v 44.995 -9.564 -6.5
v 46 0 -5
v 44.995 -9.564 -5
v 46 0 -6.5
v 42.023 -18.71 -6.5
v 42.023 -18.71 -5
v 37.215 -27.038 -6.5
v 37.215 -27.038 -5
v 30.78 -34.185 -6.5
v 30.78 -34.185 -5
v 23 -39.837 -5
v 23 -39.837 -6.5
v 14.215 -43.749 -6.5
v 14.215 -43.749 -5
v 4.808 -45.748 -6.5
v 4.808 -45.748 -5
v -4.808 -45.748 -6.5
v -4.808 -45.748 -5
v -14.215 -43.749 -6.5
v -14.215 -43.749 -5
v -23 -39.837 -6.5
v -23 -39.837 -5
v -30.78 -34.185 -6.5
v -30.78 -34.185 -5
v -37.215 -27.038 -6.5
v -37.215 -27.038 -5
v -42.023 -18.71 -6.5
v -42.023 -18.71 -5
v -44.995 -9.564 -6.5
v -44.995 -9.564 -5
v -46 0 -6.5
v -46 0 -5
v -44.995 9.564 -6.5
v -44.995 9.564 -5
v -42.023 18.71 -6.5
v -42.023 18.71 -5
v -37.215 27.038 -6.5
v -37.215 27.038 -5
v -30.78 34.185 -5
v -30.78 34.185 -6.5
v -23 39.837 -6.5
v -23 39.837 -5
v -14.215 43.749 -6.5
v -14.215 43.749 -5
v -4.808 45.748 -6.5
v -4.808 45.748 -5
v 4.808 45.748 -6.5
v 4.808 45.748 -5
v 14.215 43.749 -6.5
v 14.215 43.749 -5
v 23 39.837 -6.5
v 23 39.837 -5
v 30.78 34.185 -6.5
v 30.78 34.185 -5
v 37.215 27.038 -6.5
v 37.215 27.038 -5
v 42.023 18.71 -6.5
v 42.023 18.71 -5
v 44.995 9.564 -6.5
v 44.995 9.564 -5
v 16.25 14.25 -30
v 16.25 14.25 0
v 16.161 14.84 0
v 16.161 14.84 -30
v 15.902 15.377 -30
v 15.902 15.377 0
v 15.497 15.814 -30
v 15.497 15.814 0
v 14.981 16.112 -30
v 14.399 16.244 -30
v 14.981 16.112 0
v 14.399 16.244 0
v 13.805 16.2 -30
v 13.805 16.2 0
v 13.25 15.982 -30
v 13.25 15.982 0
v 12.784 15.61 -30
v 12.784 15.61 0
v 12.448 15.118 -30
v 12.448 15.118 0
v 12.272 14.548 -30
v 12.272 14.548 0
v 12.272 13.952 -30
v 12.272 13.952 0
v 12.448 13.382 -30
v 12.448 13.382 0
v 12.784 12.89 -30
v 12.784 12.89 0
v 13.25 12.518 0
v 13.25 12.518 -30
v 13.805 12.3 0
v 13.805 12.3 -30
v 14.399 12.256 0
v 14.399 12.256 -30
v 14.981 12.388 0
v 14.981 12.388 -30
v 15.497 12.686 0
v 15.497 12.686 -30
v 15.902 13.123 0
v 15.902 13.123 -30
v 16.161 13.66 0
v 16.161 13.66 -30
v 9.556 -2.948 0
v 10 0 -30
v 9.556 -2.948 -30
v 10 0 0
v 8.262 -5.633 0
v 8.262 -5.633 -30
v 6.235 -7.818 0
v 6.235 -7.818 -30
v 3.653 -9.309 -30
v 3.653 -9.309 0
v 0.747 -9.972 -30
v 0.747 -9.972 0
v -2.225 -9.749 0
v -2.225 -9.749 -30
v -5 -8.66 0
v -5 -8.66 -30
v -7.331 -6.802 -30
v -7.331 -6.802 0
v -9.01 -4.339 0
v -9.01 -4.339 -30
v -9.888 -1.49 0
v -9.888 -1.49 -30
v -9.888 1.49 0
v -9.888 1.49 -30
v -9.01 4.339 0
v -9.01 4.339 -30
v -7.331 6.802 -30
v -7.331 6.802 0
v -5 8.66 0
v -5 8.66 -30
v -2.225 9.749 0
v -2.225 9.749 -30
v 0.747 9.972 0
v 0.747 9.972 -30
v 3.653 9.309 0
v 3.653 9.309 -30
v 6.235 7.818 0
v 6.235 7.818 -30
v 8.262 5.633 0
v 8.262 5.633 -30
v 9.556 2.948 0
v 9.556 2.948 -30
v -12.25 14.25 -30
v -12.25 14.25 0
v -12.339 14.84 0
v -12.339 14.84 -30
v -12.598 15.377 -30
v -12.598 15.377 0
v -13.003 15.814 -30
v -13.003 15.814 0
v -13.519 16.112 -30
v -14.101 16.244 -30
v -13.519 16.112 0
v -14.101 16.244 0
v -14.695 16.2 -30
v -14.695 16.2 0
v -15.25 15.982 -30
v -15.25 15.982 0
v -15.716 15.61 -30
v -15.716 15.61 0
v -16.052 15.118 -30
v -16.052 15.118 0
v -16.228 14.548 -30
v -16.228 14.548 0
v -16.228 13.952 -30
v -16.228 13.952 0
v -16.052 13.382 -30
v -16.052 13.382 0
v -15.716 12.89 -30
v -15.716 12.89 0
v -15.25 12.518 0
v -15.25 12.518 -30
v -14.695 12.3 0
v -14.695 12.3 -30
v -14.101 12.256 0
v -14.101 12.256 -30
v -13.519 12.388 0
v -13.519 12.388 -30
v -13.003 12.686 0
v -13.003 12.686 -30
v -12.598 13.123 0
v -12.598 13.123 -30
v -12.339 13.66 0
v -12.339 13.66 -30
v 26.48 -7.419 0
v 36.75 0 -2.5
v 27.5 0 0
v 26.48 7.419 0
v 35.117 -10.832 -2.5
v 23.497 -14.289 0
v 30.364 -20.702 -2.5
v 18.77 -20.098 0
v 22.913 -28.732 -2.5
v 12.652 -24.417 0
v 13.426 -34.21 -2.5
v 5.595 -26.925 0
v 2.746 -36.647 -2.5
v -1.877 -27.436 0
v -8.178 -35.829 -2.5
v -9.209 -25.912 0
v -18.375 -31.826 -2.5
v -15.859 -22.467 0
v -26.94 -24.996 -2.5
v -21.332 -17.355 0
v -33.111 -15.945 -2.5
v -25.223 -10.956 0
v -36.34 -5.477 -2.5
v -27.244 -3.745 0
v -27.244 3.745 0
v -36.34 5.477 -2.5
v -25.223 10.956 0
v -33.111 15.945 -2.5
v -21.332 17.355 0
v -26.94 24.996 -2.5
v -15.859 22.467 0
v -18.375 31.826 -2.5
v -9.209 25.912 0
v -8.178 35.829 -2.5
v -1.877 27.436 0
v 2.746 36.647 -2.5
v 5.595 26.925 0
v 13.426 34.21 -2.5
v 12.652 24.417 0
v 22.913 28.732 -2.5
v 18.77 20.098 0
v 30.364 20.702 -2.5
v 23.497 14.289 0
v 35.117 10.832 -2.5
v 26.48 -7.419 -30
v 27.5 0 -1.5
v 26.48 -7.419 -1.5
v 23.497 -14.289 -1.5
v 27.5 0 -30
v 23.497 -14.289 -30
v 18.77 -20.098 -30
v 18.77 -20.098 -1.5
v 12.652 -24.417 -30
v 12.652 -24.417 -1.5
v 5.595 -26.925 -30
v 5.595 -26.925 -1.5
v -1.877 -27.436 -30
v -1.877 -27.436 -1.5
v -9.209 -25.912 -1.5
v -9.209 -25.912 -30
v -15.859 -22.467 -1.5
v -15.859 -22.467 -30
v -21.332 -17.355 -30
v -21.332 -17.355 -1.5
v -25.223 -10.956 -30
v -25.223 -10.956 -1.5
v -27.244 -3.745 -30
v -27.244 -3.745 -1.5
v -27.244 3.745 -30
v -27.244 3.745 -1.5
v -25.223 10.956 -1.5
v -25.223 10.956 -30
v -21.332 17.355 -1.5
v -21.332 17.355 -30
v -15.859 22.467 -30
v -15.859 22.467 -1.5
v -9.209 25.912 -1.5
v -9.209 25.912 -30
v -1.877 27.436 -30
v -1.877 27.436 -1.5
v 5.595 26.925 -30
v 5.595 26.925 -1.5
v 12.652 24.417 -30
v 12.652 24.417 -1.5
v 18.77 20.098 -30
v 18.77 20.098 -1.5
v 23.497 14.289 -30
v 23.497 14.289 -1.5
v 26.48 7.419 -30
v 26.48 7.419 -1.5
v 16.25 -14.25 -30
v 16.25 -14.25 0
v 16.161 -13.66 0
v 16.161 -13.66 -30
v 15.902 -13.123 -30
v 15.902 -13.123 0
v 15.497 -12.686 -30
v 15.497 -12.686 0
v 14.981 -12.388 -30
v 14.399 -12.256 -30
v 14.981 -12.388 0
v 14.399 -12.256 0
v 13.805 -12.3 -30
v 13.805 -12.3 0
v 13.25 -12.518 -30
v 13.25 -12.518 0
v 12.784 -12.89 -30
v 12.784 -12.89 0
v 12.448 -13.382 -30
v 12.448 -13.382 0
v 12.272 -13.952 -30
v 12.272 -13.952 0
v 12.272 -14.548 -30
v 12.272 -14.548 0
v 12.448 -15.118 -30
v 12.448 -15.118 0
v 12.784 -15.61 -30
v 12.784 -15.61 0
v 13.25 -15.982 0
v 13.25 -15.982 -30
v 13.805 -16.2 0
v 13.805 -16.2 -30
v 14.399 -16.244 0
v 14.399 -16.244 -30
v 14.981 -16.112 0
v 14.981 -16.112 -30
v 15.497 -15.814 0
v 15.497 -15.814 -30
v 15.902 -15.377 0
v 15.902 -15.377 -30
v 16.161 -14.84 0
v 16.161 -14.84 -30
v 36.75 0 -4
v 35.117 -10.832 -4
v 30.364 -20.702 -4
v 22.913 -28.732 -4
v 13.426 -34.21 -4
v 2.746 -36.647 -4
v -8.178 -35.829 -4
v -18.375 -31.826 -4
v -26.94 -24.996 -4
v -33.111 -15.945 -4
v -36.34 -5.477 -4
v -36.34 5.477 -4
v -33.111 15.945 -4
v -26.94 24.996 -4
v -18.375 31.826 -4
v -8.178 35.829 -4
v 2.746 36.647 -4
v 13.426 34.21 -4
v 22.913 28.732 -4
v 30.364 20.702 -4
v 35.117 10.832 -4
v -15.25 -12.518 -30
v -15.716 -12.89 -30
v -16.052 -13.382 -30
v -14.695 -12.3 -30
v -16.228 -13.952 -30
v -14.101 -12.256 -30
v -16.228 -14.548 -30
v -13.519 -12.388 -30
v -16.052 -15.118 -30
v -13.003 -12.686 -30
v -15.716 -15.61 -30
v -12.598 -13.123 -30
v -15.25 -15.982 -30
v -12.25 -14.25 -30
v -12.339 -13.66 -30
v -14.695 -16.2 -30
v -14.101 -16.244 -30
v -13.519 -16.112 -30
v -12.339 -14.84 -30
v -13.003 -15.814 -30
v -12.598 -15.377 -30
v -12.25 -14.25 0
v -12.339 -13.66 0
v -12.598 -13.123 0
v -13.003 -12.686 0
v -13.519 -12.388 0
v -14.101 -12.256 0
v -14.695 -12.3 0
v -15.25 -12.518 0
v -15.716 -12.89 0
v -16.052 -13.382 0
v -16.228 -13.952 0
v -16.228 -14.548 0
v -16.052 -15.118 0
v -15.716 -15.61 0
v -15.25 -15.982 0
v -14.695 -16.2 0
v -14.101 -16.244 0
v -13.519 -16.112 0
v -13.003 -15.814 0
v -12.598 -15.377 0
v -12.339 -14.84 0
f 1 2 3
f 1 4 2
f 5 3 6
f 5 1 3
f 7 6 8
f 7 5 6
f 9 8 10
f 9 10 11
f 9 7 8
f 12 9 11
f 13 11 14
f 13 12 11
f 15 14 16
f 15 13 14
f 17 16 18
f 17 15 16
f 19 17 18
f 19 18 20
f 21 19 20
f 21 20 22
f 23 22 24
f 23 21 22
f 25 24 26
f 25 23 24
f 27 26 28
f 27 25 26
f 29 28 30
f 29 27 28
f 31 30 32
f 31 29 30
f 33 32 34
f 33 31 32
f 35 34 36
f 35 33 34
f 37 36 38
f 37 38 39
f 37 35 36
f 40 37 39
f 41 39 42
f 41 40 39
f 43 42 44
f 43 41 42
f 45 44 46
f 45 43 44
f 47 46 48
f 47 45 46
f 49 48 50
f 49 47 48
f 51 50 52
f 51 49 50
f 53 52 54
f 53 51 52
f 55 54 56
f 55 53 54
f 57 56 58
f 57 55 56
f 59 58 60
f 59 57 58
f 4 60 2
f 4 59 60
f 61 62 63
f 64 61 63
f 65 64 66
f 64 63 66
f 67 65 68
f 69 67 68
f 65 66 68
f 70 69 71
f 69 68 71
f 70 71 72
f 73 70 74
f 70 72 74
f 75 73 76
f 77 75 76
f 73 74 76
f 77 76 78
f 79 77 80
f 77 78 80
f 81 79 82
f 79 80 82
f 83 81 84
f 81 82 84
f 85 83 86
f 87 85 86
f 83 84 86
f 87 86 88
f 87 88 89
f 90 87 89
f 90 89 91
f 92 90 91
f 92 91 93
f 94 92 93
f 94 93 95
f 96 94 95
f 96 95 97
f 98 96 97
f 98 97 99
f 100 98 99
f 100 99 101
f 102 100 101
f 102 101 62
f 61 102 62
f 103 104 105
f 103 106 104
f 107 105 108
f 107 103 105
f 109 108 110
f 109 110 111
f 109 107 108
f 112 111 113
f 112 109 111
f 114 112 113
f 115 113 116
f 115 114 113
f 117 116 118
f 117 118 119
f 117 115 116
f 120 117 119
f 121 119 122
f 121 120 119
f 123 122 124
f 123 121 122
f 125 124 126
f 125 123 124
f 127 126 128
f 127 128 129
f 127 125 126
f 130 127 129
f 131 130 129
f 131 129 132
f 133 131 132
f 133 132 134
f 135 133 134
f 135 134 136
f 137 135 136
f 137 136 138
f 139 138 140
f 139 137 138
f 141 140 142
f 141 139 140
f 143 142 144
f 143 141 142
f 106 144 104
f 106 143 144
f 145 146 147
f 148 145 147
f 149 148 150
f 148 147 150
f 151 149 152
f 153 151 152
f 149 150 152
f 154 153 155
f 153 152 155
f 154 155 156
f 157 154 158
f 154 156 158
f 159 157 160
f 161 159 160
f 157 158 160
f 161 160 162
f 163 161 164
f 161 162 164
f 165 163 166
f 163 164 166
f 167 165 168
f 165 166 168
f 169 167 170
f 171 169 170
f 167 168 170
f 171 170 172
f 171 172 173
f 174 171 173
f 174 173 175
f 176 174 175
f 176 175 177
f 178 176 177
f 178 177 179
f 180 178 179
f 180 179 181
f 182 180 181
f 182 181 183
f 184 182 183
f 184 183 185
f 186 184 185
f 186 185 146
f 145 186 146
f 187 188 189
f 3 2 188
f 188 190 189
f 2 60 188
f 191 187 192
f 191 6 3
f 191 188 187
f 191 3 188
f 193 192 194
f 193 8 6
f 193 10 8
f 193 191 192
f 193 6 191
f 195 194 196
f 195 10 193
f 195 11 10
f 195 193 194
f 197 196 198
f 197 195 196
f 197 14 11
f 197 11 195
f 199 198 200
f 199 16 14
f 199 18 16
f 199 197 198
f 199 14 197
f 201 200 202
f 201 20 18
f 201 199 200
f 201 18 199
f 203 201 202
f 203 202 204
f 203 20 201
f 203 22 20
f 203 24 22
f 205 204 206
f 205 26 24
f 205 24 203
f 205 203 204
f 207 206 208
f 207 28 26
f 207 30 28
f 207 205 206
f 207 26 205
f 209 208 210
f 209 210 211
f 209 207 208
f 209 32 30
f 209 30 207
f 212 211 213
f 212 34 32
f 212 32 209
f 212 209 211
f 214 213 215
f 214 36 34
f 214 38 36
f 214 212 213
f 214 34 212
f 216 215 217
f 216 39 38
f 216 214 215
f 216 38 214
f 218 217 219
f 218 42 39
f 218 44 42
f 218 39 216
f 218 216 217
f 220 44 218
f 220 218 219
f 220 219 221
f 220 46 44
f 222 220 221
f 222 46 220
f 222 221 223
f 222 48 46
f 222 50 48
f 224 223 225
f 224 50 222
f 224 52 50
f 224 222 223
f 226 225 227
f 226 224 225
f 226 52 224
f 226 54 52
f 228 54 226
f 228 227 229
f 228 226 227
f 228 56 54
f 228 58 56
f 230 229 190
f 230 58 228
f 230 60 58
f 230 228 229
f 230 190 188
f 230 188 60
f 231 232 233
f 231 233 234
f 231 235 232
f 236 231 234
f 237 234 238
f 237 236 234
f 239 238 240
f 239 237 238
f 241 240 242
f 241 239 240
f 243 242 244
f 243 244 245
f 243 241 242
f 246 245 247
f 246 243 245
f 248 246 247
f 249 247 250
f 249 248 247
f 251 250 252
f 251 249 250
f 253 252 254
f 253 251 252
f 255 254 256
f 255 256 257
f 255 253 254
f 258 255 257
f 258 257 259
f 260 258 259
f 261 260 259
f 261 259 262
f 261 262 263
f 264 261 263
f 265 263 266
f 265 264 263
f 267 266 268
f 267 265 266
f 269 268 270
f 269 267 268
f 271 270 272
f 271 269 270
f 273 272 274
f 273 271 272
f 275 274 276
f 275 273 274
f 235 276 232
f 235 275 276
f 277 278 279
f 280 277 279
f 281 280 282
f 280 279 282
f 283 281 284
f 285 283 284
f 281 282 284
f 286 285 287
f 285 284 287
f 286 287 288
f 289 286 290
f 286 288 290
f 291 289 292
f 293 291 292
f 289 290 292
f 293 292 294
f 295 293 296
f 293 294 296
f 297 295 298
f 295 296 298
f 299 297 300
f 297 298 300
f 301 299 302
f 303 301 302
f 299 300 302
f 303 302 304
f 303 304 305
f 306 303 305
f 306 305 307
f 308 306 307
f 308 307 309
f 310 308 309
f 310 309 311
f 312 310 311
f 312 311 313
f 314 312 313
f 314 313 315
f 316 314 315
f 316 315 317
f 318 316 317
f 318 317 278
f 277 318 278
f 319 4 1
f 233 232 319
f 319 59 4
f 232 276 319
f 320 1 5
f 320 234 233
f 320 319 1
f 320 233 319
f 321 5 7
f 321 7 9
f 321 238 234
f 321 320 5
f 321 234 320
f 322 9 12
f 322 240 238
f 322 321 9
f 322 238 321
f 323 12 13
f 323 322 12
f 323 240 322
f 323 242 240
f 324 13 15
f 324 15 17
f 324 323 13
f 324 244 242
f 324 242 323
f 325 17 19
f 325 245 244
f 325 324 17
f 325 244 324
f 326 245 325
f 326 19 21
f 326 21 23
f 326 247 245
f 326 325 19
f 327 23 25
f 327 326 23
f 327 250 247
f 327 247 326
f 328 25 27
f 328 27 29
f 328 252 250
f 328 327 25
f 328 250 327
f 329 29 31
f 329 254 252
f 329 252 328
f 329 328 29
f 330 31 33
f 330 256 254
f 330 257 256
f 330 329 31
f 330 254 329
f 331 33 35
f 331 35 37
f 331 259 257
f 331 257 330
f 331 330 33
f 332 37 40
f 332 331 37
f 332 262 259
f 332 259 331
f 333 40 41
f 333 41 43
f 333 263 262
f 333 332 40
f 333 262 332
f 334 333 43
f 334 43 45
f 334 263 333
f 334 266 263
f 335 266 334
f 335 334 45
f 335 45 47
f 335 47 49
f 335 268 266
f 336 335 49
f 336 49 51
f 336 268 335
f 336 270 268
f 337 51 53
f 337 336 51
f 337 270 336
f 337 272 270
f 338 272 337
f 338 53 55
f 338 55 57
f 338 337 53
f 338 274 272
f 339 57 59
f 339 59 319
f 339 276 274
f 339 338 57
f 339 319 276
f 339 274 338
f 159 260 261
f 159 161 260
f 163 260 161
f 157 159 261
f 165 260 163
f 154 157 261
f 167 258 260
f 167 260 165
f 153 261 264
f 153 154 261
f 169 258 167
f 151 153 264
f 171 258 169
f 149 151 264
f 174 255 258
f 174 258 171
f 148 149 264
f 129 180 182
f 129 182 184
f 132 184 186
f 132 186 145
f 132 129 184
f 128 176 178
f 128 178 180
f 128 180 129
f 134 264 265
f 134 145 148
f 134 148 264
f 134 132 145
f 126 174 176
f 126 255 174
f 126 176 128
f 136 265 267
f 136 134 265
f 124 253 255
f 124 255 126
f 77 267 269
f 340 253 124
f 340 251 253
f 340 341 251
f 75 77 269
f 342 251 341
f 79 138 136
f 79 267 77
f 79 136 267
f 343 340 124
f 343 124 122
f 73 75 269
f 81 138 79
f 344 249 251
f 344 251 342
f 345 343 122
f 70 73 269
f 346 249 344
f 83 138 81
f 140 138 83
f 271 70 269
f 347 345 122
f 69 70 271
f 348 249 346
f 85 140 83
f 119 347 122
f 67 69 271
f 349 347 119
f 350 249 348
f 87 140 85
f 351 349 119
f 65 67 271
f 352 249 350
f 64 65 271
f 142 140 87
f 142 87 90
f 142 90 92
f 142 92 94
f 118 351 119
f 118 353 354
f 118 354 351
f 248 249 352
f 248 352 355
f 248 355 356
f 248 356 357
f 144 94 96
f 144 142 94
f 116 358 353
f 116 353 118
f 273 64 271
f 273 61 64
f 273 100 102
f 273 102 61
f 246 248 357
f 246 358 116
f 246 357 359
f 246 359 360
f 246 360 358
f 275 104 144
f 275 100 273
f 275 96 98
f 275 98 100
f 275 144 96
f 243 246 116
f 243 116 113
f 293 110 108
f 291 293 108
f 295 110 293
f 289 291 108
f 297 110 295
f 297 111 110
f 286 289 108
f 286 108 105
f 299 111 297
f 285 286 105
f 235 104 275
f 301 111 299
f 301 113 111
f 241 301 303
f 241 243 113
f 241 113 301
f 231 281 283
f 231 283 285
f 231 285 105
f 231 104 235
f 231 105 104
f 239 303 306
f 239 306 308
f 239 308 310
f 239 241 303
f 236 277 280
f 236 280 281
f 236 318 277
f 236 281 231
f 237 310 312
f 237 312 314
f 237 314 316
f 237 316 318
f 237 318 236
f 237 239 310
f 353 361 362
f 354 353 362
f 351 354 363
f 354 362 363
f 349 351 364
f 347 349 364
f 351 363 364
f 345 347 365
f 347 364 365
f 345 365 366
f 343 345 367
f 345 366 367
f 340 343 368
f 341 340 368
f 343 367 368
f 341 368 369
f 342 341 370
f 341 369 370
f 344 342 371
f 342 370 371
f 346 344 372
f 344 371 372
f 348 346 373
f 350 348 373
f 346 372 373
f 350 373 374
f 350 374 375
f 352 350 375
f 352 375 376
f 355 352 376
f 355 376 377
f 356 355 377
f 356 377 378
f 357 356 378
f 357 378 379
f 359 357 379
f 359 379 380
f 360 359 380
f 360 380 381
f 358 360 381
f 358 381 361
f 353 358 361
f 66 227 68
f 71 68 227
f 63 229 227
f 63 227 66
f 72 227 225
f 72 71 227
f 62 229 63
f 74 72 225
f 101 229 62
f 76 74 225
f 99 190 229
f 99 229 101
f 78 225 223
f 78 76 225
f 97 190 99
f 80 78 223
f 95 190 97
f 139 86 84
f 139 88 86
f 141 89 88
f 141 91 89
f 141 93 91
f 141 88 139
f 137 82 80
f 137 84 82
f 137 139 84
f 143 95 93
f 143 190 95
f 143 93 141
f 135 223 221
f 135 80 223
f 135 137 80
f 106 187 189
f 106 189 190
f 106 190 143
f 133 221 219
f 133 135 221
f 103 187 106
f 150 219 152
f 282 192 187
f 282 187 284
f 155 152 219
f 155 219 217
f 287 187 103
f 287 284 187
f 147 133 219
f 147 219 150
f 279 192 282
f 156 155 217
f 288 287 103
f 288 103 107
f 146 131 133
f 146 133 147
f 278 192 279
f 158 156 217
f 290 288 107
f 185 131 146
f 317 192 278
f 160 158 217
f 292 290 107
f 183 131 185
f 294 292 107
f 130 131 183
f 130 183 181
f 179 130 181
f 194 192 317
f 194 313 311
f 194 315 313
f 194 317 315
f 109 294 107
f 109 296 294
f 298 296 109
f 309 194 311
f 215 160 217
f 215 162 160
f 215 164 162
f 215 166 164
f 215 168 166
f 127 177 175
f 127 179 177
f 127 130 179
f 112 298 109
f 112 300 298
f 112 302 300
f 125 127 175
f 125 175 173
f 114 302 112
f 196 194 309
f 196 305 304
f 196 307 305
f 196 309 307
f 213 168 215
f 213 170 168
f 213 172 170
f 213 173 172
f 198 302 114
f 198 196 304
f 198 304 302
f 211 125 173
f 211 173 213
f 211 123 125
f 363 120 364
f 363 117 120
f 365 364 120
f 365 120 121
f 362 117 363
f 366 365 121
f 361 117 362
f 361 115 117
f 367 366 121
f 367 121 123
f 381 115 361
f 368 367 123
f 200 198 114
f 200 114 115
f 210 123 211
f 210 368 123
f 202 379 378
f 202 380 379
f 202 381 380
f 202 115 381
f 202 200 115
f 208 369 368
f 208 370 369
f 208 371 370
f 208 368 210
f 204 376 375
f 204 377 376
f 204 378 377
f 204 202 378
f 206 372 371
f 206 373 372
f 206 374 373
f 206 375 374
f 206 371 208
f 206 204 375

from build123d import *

# Parameters (mm, degrees)
SKETCH2_R          = 2
CUT_EXTRUDE1_DEPTH = 72.637978754


with BuildPart() as part:
    # Sketch1 → Revolve1 (revolve)
    with BuildSketch(Plane(origin=(0, 0, 0), x_dir=(0, 0, -1), z_dir=(1, 0, 0)), mode=Mode.PRIVATE) as revolve1_sk:
        Polygon((0, 10), (0, 27.5), (5, 46), (6.5, 46), (1.5, 27.5), (30, 27.5), (30, 10), align=None)
    revolve(revolve1_sk.sketch.rotate(Axis((0, 0, 467.574650711), (0, 0, -1)), 90), axis=Axis((0, 0, 467.574650711), (0, 0, -1)))

    # Sketch2 → Cut-Extrude1 (cut, through all)
    with BuildSketch(Plane.XY):
        with Locations((-14.25, 14.25)):
            Circle(SKETCH2_R)
        with Locations((14.25, 14.25)):
            Circle(SKETCH2_R)
        with Locations((14.25, -14.25)):
            Circle(SKETCH2_R)
        with Locations((-14.25, -14.25)):
            Circle(SKETCH2_R)
    extrude(amount=-CUT_EXTRUDE1_DEPTH, mode=Mode.SUBTRACT)


solid = part.part
